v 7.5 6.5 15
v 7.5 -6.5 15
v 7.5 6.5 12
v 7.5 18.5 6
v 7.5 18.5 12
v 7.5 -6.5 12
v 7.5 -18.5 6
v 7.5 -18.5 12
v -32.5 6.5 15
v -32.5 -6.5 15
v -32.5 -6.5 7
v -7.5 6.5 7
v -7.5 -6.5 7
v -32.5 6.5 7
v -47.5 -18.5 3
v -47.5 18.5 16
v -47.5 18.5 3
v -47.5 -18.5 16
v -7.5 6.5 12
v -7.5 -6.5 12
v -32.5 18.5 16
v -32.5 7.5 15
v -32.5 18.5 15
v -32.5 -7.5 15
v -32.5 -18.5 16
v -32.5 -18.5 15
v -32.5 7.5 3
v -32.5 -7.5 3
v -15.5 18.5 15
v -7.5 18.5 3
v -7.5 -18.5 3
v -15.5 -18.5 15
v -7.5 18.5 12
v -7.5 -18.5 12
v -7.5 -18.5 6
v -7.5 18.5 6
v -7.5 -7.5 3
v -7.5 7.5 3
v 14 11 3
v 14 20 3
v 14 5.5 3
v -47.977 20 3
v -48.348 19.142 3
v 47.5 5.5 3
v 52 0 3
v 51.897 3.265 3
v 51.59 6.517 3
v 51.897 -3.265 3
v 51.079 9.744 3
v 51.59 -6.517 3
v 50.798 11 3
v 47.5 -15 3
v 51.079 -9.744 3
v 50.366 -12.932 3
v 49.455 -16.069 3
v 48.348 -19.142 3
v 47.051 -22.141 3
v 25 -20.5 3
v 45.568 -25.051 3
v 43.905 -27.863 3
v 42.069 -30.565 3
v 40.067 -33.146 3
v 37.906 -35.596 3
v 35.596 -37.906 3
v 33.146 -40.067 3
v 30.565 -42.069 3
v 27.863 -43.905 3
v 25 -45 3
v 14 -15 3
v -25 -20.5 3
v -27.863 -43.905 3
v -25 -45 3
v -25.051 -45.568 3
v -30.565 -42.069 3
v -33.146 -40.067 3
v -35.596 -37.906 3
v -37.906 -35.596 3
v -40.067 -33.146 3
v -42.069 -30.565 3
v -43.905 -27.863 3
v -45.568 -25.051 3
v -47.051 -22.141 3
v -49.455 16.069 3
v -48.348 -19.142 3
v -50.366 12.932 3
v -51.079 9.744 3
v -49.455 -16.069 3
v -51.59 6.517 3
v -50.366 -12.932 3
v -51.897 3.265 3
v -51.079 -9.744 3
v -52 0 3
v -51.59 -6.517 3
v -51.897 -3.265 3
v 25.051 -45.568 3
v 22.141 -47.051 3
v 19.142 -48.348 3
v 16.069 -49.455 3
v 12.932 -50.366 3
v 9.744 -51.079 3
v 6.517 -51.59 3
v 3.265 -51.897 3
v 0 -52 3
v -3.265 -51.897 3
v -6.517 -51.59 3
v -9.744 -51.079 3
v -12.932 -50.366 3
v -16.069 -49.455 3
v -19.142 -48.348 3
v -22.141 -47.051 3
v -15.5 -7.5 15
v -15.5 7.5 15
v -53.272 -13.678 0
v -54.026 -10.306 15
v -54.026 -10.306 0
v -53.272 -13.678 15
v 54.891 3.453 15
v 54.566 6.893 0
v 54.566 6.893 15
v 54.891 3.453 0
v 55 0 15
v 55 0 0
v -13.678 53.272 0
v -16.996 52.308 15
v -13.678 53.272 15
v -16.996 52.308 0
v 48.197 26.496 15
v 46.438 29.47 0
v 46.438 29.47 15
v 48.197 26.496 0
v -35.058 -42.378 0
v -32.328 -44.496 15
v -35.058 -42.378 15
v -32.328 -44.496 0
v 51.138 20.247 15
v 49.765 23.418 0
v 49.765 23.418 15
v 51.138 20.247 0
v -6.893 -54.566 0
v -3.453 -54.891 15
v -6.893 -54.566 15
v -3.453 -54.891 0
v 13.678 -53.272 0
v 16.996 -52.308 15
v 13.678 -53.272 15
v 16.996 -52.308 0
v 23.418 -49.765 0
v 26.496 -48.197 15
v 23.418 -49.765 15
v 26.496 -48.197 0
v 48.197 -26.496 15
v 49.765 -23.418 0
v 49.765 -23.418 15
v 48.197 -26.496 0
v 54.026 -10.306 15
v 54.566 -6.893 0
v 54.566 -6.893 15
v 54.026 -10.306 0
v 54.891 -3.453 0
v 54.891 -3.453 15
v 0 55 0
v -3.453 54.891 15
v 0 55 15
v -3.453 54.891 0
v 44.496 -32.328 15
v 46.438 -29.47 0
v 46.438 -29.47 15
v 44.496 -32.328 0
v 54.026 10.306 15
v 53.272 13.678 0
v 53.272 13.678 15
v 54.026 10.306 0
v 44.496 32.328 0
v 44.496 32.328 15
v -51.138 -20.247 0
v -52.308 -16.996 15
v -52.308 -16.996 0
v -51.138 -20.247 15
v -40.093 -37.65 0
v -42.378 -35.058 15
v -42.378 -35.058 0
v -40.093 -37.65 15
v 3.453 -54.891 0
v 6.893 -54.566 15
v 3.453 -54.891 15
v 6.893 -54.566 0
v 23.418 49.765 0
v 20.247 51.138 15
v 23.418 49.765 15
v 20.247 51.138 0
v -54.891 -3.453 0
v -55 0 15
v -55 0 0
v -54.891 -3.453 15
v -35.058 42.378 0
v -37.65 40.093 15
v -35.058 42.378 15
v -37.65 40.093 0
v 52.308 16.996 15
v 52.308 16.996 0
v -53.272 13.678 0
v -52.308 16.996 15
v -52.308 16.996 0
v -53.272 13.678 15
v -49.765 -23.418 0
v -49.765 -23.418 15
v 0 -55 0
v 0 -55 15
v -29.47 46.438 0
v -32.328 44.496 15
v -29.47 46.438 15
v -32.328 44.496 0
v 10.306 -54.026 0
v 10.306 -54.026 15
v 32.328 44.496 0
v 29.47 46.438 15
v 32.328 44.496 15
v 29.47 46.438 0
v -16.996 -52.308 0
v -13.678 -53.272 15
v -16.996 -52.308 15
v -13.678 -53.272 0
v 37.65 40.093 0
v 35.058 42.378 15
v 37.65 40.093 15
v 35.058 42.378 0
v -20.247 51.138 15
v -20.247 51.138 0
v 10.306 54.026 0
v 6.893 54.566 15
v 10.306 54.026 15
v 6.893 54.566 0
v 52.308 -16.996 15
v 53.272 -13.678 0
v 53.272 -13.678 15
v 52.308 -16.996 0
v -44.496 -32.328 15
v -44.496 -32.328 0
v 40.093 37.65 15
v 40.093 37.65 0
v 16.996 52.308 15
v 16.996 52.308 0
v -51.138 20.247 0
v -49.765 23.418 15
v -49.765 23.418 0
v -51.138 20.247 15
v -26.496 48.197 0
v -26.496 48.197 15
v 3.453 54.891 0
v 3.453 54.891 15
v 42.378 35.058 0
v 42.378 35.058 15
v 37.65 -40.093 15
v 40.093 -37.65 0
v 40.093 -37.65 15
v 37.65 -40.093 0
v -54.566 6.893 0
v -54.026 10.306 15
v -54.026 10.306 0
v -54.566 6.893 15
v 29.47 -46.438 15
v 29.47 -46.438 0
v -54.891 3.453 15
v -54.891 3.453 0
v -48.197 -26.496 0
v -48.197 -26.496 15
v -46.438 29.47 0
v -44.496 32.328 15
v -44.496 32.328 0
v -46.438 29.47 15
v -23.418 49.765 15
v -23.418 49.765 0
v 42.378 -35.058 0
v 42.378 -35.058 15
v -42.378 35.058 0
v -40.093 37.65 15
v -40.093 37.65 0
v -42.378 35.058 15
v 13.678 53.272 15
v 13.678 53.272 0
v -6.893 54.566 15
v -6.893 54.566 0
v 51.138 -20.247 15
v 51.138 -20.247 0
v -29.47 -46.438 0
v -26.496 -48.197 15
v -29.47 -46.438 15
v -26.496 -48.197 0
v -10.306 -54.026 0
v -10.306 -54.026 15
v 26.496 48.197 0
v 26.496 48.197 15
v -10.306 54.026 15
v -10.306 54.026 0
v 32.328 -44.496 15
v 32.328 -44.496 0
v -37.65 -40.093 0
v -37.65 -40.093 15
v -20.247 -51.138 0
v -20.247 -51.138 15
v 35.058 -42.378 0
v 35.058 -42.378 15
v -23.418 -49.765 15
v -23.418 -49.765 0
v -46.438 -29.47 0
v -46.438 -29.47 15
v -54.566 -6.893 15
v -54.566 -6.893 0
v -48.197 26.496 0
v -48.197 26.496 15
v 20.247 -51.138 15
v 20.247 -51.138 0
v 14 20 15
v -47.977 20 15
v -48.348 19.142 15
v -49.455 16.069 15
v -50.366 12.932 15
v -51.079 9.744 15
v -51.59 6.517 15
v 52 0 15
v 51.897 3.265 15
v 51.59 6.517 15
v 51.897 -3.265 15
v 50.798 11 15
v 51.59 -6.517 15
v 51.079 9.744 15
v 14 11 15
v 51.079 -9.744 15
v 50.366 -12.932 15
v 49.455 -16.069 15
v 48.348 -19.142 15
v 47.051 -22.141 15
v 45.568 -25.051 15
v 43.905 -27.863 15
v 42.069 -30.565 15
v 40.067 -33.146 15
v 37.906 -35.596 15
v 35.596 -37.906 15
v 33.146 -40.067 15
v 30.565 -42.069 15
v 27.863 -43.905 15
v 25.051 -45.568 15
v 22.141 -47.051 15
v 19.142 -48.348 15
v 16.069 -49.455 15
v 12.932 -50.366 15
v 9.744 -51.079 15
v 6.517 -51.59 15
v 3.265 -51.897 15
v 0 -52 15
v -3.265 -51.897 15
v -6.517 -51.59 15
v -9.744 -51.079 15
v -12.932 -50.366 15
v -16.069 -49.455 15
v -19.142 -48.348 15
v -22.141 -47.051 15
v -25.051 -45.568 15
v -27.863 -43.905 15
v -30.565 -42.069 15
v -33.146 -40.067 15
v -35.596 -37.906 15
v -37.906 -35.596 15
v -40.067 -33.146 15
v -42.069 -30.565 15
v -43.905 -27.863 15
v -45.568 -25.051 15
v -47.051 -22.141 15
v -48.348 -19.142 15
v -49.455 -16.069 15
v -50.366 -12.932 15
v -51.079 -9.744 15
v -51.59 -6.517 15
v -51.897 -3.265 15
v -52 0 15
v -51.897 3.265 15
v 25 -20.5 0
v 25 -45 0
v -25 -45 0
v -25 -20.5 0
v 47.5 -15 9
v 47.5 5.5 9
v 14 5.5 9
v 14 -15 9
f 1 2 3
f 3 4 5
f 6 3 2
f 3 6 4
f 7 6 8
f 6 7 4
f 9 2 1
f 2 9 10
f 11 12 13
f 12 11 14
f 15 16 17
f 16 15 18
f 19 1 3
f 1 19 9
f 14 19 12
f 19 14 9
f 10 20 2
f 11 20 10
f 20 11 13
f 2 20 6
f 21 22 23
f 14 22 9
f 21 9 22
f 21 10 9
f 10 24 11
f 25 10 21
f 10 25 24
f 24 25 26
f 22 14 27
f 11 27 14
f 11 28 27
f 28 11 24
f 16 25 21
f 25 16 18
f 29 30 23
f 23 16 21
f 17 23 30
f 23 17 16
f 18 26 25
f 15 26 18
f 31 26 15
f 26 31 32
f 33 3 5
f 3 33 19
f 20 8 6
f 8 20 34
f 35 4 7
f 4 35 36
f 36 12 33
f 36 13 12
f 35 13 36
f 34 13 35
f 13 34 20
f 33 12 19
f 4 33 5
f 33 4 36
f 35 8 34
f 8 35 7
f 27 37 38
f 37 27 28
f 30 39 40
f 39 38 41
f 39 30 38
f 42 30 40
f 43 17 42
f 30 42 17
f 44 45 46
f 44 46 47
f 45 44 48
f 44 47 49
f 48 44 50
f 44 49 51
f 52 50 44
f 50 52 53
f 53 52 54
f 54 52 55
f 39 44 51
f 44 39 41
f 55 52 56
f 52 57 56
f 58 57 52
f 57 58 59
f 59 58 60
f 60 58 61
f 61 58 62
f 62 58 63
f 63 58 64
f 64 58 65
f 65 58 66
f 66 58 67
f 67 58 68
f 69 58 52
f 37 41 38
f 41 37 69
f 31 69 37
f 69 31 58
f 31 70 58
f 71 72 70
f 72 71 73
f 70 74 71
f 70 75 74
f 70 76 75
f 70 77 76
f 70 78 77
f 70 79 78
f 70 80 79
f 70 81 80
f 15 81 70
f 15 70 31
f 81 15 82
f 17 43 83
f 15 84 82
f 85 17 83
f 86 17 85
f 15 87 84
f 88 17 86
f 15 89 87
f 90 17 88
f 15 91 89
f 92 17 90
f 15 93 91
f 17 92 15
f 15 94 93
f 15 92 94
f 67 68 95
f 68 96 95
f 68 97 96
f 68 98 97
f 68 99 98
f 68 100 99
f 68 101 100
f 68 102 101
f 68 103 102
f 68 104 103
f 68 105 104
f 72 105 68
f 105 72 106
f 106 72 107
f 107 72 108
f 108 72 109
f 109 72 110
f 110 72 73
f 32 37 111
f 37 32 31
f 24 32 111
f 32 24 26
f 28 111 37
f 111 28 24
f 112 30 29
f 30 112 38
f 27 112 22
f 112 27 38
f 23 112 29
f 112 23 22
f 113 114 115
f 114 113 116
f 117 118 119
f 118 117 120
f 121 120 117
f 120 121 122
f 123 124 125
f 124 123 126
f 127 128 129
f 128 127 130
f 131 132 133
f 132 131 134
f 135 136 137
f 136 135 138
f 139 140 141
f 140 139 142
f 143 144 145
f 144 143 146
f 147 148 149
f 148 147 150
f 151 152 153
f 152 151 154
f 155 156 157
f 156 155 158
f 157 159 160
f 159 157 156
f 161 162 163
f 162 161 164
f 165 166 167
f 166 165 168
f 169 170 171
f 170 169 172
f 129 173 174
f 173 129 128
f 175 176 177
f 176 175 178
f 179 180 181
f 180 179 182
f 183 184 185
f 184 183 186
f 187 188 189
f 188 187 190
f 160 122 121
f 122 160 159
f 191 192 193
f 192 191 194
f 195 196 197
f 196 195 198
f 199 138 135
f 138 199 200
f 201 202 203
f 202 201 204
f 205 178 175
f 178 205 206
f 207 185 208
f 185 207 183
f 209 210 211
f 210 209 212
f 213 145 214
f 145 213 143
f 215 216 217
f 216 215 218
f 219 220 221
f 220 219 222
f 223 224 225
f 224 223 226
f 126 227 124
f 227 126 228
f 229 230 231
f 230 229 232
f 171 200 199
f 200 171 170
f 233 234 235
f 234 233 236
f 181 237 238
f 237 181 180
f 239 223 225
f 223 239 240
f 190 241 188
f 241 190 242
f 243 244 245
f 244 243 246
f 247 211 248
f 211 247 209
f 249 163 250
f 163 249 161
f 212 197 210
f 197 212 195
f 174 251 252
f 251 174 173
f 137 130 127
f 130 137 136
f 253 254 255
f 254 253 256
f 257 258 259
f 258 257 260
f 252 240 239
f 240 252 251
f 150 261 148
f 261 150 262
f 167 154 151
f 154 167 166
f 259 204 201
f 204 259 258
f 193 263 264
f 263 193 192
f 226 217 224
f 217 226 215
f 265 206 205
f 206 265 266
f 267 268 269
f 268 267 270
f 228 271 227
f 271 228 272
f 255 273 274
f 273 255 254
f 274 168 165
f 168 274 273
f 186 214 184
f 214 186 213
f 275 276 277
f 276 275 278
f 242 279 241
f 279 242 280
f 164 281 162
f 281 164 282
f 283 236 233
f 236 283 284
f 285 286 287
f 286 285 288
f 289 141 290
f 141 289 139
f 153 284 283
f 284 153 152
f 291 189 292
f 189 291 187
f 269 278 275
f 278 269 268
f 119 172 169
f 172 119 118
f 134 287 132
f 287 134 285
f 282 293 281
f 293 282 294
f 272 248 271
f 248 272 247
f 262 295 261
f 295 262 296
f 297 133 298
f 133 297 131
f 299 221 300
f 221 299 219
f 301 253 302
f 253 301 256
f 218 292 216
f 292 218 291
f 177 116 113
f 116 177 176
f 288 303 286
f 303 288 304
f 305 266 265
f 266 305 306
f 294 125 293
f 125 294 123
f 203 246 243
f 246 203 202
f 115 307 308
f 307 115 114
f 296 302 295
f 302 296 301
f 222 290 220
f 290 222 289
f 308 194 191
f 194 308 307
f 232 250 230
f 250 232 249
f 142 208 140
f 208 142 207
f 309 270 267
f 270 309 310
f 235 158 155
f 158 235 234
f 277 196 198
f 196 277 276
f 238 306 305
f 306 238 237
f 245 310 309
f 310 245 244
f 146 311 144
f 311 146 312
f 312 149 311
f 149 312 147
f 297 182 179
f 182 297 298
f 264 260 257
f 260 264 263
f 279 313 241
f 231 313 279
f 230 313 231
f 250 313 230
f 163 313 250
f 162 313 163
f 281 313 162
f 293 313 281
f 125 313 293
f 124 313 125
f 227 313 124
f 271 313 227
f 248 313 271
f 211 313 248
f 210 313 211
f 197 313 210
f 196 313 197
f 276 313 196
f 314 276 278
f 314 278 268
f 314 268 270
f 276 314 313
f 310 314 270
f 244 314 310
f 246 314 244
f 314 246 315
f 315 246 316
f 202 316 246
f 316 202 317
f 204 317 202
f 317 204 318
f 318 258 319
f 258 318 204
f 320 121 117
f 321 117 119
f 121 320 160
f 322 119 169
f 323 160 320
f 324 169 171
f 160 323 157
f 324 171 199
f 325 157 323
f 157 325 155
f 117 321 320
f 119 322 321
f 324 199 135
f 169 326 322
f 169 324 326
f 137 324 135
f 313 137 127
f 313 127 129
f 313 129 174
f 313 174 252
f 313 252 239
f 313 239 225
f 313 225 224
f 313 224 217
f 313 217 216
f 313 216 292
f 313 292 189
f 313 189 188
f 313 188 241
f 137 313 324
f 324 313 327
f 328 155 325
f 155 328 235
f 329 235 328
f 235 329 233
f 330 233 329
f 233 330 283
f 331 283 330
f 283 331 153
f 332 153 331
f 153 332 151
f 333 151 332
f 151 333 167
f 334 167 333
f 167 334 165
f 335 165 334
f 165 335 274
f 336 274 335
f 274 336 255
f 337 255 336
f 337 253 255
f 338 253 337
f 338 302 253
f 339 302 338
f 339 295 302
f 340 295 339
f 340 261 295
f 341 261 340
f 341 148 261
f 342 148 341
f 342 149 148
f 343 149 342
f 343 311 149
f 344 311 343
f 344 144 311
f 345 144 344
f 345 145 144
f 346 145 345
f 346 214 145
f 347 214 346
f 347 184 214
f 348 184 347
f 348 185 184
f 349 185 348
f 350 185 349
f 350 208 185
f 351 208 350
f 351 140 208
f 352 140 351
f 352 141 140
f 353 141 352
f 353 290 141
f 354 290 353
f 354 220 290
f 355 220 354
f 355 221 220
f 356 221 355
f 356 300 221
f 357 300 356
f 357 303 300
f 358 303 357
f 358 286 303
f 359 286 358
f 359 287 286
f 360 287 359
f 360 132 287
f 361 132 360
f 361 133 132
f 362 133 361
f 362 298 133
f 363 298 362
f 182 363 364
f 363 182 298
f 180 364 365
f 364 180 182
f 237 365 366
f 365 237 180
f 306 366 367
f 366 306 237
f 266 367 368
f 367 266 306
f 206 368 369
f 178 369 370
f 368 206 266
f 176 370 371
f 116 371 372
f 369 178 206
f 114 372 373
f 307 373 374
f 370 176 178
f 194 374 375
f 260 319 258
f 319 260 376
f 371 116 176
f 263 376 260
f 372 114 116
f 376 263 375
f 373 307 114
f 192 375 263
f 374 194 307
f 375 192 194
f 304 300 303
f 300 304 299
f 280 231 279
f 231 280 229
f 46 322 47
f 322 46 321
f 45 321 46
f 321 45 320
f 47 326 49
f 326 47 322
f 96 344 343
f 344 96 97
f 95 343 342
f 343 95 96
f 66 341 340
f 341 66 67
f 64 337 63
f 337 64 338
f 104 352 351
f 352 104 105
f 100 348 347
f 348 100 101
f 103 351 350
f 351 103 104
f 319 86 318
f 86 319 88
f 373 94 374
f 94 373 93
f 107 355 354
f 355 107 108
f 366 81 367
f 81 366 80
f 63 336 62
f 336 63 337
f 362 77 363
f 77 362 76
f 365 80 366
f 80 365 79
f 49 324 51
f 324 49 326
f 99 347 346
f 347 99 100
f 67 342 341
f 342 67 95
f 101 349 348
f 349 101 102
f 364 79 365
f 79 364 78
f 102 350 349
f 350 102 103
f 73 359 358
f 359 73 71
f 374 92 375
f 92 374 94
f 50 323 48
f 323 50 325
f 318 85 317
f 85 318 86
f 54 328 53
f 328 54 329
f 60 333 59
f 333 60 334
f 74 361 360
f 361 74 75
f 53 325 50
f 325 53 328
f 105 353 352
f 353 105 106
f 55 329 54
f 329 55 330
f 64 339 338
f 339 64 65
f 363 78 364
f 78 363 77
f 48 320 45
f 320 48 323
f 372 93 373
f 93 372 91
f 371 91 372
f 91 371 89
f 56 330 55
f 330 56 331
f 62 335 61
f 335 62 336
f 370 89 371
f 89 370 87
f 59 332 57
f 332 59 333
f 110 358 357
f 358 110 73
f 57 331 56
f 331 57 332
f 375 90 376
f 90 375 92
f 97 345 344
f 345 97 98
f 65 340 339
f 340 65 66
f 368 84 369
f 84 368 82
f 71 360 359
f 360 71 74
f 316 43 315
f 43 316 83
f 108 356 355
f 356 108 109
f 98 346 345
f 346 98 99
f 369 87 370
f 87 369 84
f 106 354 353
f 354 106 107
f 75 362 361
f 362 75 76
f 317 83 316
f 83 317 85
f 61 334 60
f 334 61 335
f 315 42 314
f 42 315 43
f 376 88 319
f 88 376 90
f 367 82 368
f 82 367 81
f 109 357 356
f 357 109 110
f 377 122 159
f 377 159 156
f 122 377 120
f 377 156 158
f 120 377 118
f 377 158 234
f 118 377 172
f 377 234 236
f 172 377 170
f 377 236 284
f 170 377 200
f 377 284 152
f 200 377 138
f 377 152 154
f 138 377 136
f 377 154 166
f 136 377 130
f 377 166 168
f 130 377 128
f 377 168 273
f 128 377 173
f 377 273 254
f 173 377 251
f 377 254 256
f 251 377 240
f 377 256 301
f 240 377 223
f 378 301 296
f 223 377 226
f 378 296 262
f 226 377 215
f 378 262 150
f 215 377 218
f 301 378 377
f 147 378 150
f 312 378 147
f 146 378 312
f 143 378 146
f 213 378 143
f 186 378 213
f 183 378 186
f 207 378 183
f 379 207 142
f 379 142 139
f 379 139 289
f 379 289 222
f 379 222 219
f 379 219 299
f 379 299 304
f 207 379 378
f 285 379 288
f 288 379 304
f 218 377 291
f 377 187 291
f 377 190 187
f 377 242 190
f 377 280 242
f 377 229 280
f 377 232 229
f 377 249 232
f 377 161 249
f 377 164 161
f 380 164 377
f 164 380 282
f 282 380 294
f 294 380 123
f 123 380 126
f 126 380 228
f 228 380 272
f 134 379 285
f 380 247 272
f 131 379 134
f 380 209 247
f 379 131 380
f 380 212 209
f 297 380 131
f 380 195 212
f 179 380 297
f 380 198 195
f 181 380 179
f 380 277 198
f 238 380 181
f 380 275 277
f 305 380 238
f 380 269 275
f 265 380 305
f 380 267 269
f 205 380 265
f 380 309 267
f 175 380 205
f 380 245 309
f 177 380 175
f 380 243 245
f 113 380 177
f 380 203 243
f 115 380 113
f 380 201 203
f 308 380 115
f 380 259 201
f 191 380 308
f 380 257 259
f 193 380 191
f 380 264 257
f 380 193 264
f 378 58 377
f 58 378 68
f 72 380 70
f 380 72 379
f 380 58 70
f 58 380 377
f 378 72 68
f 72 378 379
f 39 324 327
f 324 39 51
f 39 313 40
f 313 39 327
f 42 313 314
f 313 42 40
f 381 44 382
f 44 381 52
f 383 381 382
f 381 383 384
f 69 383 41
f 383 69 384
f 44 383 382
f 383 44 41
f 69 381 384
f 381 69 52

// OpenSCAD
//Konstanten
//Hoehe der Grundflaeche
baseHeight = 3; //mm
edgeWidth = 3;

//Ausmase der Load Cell
xLoadCell = 55;
yLoadCell = 13;
zLoadCell = 8;

//Ausmase der Metallbuegel
xLCClamp = 15;
yLCClamp = 37;
zLCClamp = 6;

//Ausmase des Batteriefachs
xBattery = 50;
yBattery = 24.5;
zBattery = 13;

//Ausmase des hx711 Moduls
xHX711 = 33.5;
yHX711 = 20.5;
zHX711 = 3;

//Ausmase des hx711 Boards
zBoard = 12 ;  //TODO nachmessen!

//Lasse 4 mm Platz zum Boden damit sich die Load Cell verbiegen kann
dist = 4;


module trapezoid(width_base, width_top,height,thickness) {
    translate([0,thickness,0]){
    rotate([90,0,0]){
  linear_extrude(height = thickness) polygon(points=[[0,0],[width_base,0],[width_base-(width_base-width_top),height],[0,height]], paths=[[0,1,2,3]]); 
    }
}
}

module Base($fn) {
    
    edgeHeight = height - baseHeight;
    
    //Grundflaeche
    cylinder(h=baseHeight,r=diameter/2,center=false);
    //Rand
    translate([0,0,baseHeight]){
        difference() {
            cylinder(h=edgeHeight,r=diameter/2,center=false);
            cylinder(h=edgeHeight*3,r=(diameter/2)-edgeWidth,center=true);
        }
    }
}

//alles was aus Metall ist
module LoadCell() {
    //linke Seite der Load Cell muss 47.5mm vom Mittelpunkt entfernt sein
    //damit das Loch genau im Mittelpunkt liegt
    translate([-47.5,-yLoadCell/2,baseHeight+dist]){
        cube(size=[xLoadCell,yLoadCell,zLoadCell], center=false);
    }
    //erster Metallhalter ist ca. 1mm dick ueber der Load Cell
    translate([-47.5,-yLCClamp/2,baseHeight+dist+zLoadCell-(zLCClamp-1)]){
        cube(size=[xLCClamp,yLCClamp,zLCClamp], center=false);
    }
    //zweiter Metallhalter ist ca. 1mm dick unter der Load Cell
    translate([-47.5+xLoadCell-xLCClamp,-yLCClamp/2,baseHeight+dist-1]){
        cube(size=[xLCClamp,yLCClamp,zLCClamp], center=false);
    }
}

module LoadCellMount(){
    //Halterung fuer ersten Metallhalter
    translate([-47.5,-yLCClamp/2,baseHeight]){
        cube(size=[xLCClamp,yLCClamp,dist+zLoadCell-(zLCClamp-1)], center=false);
    }
    translate([-47.5+xLCClamp,-yLCClamp/2,baseHeight]){
        trapezoid(xLoadCell-(2*xLCClamp),17,dist+zLoadCell,
        (yLCClamp-yLoadCell)/2 - 1);
    }
    translate([-47.5+xLCClamp,yLoadCell/2 + 1,baseHeight]){
        trapezoid(xLoadCell-(2*xLCClamp),17,dist+zLoadCell,
        (yLCClamp-yLoadCell)/2 - 1);
    }
}

module Battery(posX, posY){
    translate([posX,posY,-0.1]){
        cube(size=[xBattery,yBattery,zBattery+0.1], center=false);
    }
}

module HX711(){
    translate([HX711posX,HX711posY,baseHeight+HX711distToBase]){
        cube(size=[xHX711,yHX711,zHX711], center=false);
    }
}

module HX711Mount(){
    translate([HX711posX,HX711posY,baseHeight]){
        cube(size=[xHX711,yHX711,HX711distToBase], center=false);
    }
}

module Board(yBottom1, yBottom2, $fn){
    difference() {
        translate([0,0,baseHeight]){
            cylinder(h=zBoard,r=diameter/2-edgeWidth,center=false);
        }
        union(){
            translate([-100,-100+yBottom1,0.1]){
                cube(size=[200,100,30]);
            }
            translate([-100,-100+yBottom2,0.1]){
                cube(size=[100+14,100,30]);
            }
        }
    }
}

module Fill($fn){
    difference(){
        cylinder(h=height,r=diameter/2,center=false);
        union(){
            //LoadCell();
            //LoadCellMount();
            scale([1,1,2]){
                Battery(BatteryPosX, BatteryPosY);
            }
            //HX711();
            //HX711Mount();
            //Board(11,20,feinheit);
        }
    }
}

//Freiheitsgrade
//Durchmesser in mm, Hoehe (mit Rand) in mm, Feinheit
diameter = 110;
height = 15;
feinheit = 100;

#LoadCell();
LoadCellMount();

BatteryPosX = -25;
BatteryPosY = -45;
difference() {
    Base(feinheit);
    #Battery(BatteryPosX, BatteryPosY);
}

HX711posX = 14;
HX711posY = -15;
HX711distToBase = 3;
#HX711();
HX711Mount();
color([0,1,1,0.5]){
    Board(11,20,feinheit);
}

//Fill(feinheit);
